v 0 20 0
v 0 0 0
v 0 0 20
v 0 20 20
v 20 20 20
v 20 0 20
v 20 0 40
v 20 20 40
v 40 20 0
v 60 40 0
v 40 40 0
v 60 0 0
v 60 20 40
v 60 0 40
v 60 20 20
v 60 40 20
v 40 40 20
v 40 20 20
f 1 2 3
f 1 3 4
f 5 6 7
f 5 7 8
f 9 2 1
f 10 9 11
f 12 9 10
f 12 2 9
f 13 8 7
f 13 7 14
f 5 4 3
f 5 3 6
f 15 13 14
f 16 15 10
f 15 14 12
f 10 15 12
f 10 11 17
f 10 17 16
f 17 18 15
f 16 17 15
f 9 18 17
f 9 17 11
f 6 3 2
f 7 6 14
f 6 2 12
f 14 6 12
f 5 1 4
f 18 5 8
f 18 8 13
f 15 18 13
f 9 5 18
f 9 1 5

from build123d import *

# Parameters (mm, degrees)
ESBO_O1_W                = 60
ESBO_O1_H                = 20
RESSALTO_EXTRUS_O1_DEPTH = 20
ESBO_O2_W                = 40
ESBO_O2_H                = 20
RESSALTO_EXTRUS_O2_DEPTH = 20
ESBO_O3_W                = 20
ESBO_O3_H                = 20
RESSALTO_EXTRUS_O3_DEPTH = 20


with BuildPart() as part:
    # Esboço1 → Ressalto-extrusão1 (new body)
    with BuildSketch(Plane.XY):
        with Locations((30, 10)):
            Rectangle(ESBO_O1_W, ESBO_O1_H)
    extrude(amount=RESSALTO_EXTRUS_O1_DEPTH)

    # Esboço2 → Ressalto-extrusão2 (add)
    with BuildSketch(Plane.XY.offset(20)):
        with Locations((40, 10)):
            Rectangle(ESBO_O2_W, ESBO_O2_H)
    extrude(amount=RESSALTO_EXTRUS_O2_DEPTH)

    # Esboço3 → Ressalto-extrusão3 (add)
    with BuildSketch(Plane(origin=(0, 20, 0), x_dir=(1, 0, 0), z_dir=(0, 1, 0))):
        with Locations((50, -10)):
            Rectangle(ESBO_O3_W, ESBO_O3_H)
    extrude(amount=RESSALTO_EXTRUS_O3_DEPTH)


solid = part.part
